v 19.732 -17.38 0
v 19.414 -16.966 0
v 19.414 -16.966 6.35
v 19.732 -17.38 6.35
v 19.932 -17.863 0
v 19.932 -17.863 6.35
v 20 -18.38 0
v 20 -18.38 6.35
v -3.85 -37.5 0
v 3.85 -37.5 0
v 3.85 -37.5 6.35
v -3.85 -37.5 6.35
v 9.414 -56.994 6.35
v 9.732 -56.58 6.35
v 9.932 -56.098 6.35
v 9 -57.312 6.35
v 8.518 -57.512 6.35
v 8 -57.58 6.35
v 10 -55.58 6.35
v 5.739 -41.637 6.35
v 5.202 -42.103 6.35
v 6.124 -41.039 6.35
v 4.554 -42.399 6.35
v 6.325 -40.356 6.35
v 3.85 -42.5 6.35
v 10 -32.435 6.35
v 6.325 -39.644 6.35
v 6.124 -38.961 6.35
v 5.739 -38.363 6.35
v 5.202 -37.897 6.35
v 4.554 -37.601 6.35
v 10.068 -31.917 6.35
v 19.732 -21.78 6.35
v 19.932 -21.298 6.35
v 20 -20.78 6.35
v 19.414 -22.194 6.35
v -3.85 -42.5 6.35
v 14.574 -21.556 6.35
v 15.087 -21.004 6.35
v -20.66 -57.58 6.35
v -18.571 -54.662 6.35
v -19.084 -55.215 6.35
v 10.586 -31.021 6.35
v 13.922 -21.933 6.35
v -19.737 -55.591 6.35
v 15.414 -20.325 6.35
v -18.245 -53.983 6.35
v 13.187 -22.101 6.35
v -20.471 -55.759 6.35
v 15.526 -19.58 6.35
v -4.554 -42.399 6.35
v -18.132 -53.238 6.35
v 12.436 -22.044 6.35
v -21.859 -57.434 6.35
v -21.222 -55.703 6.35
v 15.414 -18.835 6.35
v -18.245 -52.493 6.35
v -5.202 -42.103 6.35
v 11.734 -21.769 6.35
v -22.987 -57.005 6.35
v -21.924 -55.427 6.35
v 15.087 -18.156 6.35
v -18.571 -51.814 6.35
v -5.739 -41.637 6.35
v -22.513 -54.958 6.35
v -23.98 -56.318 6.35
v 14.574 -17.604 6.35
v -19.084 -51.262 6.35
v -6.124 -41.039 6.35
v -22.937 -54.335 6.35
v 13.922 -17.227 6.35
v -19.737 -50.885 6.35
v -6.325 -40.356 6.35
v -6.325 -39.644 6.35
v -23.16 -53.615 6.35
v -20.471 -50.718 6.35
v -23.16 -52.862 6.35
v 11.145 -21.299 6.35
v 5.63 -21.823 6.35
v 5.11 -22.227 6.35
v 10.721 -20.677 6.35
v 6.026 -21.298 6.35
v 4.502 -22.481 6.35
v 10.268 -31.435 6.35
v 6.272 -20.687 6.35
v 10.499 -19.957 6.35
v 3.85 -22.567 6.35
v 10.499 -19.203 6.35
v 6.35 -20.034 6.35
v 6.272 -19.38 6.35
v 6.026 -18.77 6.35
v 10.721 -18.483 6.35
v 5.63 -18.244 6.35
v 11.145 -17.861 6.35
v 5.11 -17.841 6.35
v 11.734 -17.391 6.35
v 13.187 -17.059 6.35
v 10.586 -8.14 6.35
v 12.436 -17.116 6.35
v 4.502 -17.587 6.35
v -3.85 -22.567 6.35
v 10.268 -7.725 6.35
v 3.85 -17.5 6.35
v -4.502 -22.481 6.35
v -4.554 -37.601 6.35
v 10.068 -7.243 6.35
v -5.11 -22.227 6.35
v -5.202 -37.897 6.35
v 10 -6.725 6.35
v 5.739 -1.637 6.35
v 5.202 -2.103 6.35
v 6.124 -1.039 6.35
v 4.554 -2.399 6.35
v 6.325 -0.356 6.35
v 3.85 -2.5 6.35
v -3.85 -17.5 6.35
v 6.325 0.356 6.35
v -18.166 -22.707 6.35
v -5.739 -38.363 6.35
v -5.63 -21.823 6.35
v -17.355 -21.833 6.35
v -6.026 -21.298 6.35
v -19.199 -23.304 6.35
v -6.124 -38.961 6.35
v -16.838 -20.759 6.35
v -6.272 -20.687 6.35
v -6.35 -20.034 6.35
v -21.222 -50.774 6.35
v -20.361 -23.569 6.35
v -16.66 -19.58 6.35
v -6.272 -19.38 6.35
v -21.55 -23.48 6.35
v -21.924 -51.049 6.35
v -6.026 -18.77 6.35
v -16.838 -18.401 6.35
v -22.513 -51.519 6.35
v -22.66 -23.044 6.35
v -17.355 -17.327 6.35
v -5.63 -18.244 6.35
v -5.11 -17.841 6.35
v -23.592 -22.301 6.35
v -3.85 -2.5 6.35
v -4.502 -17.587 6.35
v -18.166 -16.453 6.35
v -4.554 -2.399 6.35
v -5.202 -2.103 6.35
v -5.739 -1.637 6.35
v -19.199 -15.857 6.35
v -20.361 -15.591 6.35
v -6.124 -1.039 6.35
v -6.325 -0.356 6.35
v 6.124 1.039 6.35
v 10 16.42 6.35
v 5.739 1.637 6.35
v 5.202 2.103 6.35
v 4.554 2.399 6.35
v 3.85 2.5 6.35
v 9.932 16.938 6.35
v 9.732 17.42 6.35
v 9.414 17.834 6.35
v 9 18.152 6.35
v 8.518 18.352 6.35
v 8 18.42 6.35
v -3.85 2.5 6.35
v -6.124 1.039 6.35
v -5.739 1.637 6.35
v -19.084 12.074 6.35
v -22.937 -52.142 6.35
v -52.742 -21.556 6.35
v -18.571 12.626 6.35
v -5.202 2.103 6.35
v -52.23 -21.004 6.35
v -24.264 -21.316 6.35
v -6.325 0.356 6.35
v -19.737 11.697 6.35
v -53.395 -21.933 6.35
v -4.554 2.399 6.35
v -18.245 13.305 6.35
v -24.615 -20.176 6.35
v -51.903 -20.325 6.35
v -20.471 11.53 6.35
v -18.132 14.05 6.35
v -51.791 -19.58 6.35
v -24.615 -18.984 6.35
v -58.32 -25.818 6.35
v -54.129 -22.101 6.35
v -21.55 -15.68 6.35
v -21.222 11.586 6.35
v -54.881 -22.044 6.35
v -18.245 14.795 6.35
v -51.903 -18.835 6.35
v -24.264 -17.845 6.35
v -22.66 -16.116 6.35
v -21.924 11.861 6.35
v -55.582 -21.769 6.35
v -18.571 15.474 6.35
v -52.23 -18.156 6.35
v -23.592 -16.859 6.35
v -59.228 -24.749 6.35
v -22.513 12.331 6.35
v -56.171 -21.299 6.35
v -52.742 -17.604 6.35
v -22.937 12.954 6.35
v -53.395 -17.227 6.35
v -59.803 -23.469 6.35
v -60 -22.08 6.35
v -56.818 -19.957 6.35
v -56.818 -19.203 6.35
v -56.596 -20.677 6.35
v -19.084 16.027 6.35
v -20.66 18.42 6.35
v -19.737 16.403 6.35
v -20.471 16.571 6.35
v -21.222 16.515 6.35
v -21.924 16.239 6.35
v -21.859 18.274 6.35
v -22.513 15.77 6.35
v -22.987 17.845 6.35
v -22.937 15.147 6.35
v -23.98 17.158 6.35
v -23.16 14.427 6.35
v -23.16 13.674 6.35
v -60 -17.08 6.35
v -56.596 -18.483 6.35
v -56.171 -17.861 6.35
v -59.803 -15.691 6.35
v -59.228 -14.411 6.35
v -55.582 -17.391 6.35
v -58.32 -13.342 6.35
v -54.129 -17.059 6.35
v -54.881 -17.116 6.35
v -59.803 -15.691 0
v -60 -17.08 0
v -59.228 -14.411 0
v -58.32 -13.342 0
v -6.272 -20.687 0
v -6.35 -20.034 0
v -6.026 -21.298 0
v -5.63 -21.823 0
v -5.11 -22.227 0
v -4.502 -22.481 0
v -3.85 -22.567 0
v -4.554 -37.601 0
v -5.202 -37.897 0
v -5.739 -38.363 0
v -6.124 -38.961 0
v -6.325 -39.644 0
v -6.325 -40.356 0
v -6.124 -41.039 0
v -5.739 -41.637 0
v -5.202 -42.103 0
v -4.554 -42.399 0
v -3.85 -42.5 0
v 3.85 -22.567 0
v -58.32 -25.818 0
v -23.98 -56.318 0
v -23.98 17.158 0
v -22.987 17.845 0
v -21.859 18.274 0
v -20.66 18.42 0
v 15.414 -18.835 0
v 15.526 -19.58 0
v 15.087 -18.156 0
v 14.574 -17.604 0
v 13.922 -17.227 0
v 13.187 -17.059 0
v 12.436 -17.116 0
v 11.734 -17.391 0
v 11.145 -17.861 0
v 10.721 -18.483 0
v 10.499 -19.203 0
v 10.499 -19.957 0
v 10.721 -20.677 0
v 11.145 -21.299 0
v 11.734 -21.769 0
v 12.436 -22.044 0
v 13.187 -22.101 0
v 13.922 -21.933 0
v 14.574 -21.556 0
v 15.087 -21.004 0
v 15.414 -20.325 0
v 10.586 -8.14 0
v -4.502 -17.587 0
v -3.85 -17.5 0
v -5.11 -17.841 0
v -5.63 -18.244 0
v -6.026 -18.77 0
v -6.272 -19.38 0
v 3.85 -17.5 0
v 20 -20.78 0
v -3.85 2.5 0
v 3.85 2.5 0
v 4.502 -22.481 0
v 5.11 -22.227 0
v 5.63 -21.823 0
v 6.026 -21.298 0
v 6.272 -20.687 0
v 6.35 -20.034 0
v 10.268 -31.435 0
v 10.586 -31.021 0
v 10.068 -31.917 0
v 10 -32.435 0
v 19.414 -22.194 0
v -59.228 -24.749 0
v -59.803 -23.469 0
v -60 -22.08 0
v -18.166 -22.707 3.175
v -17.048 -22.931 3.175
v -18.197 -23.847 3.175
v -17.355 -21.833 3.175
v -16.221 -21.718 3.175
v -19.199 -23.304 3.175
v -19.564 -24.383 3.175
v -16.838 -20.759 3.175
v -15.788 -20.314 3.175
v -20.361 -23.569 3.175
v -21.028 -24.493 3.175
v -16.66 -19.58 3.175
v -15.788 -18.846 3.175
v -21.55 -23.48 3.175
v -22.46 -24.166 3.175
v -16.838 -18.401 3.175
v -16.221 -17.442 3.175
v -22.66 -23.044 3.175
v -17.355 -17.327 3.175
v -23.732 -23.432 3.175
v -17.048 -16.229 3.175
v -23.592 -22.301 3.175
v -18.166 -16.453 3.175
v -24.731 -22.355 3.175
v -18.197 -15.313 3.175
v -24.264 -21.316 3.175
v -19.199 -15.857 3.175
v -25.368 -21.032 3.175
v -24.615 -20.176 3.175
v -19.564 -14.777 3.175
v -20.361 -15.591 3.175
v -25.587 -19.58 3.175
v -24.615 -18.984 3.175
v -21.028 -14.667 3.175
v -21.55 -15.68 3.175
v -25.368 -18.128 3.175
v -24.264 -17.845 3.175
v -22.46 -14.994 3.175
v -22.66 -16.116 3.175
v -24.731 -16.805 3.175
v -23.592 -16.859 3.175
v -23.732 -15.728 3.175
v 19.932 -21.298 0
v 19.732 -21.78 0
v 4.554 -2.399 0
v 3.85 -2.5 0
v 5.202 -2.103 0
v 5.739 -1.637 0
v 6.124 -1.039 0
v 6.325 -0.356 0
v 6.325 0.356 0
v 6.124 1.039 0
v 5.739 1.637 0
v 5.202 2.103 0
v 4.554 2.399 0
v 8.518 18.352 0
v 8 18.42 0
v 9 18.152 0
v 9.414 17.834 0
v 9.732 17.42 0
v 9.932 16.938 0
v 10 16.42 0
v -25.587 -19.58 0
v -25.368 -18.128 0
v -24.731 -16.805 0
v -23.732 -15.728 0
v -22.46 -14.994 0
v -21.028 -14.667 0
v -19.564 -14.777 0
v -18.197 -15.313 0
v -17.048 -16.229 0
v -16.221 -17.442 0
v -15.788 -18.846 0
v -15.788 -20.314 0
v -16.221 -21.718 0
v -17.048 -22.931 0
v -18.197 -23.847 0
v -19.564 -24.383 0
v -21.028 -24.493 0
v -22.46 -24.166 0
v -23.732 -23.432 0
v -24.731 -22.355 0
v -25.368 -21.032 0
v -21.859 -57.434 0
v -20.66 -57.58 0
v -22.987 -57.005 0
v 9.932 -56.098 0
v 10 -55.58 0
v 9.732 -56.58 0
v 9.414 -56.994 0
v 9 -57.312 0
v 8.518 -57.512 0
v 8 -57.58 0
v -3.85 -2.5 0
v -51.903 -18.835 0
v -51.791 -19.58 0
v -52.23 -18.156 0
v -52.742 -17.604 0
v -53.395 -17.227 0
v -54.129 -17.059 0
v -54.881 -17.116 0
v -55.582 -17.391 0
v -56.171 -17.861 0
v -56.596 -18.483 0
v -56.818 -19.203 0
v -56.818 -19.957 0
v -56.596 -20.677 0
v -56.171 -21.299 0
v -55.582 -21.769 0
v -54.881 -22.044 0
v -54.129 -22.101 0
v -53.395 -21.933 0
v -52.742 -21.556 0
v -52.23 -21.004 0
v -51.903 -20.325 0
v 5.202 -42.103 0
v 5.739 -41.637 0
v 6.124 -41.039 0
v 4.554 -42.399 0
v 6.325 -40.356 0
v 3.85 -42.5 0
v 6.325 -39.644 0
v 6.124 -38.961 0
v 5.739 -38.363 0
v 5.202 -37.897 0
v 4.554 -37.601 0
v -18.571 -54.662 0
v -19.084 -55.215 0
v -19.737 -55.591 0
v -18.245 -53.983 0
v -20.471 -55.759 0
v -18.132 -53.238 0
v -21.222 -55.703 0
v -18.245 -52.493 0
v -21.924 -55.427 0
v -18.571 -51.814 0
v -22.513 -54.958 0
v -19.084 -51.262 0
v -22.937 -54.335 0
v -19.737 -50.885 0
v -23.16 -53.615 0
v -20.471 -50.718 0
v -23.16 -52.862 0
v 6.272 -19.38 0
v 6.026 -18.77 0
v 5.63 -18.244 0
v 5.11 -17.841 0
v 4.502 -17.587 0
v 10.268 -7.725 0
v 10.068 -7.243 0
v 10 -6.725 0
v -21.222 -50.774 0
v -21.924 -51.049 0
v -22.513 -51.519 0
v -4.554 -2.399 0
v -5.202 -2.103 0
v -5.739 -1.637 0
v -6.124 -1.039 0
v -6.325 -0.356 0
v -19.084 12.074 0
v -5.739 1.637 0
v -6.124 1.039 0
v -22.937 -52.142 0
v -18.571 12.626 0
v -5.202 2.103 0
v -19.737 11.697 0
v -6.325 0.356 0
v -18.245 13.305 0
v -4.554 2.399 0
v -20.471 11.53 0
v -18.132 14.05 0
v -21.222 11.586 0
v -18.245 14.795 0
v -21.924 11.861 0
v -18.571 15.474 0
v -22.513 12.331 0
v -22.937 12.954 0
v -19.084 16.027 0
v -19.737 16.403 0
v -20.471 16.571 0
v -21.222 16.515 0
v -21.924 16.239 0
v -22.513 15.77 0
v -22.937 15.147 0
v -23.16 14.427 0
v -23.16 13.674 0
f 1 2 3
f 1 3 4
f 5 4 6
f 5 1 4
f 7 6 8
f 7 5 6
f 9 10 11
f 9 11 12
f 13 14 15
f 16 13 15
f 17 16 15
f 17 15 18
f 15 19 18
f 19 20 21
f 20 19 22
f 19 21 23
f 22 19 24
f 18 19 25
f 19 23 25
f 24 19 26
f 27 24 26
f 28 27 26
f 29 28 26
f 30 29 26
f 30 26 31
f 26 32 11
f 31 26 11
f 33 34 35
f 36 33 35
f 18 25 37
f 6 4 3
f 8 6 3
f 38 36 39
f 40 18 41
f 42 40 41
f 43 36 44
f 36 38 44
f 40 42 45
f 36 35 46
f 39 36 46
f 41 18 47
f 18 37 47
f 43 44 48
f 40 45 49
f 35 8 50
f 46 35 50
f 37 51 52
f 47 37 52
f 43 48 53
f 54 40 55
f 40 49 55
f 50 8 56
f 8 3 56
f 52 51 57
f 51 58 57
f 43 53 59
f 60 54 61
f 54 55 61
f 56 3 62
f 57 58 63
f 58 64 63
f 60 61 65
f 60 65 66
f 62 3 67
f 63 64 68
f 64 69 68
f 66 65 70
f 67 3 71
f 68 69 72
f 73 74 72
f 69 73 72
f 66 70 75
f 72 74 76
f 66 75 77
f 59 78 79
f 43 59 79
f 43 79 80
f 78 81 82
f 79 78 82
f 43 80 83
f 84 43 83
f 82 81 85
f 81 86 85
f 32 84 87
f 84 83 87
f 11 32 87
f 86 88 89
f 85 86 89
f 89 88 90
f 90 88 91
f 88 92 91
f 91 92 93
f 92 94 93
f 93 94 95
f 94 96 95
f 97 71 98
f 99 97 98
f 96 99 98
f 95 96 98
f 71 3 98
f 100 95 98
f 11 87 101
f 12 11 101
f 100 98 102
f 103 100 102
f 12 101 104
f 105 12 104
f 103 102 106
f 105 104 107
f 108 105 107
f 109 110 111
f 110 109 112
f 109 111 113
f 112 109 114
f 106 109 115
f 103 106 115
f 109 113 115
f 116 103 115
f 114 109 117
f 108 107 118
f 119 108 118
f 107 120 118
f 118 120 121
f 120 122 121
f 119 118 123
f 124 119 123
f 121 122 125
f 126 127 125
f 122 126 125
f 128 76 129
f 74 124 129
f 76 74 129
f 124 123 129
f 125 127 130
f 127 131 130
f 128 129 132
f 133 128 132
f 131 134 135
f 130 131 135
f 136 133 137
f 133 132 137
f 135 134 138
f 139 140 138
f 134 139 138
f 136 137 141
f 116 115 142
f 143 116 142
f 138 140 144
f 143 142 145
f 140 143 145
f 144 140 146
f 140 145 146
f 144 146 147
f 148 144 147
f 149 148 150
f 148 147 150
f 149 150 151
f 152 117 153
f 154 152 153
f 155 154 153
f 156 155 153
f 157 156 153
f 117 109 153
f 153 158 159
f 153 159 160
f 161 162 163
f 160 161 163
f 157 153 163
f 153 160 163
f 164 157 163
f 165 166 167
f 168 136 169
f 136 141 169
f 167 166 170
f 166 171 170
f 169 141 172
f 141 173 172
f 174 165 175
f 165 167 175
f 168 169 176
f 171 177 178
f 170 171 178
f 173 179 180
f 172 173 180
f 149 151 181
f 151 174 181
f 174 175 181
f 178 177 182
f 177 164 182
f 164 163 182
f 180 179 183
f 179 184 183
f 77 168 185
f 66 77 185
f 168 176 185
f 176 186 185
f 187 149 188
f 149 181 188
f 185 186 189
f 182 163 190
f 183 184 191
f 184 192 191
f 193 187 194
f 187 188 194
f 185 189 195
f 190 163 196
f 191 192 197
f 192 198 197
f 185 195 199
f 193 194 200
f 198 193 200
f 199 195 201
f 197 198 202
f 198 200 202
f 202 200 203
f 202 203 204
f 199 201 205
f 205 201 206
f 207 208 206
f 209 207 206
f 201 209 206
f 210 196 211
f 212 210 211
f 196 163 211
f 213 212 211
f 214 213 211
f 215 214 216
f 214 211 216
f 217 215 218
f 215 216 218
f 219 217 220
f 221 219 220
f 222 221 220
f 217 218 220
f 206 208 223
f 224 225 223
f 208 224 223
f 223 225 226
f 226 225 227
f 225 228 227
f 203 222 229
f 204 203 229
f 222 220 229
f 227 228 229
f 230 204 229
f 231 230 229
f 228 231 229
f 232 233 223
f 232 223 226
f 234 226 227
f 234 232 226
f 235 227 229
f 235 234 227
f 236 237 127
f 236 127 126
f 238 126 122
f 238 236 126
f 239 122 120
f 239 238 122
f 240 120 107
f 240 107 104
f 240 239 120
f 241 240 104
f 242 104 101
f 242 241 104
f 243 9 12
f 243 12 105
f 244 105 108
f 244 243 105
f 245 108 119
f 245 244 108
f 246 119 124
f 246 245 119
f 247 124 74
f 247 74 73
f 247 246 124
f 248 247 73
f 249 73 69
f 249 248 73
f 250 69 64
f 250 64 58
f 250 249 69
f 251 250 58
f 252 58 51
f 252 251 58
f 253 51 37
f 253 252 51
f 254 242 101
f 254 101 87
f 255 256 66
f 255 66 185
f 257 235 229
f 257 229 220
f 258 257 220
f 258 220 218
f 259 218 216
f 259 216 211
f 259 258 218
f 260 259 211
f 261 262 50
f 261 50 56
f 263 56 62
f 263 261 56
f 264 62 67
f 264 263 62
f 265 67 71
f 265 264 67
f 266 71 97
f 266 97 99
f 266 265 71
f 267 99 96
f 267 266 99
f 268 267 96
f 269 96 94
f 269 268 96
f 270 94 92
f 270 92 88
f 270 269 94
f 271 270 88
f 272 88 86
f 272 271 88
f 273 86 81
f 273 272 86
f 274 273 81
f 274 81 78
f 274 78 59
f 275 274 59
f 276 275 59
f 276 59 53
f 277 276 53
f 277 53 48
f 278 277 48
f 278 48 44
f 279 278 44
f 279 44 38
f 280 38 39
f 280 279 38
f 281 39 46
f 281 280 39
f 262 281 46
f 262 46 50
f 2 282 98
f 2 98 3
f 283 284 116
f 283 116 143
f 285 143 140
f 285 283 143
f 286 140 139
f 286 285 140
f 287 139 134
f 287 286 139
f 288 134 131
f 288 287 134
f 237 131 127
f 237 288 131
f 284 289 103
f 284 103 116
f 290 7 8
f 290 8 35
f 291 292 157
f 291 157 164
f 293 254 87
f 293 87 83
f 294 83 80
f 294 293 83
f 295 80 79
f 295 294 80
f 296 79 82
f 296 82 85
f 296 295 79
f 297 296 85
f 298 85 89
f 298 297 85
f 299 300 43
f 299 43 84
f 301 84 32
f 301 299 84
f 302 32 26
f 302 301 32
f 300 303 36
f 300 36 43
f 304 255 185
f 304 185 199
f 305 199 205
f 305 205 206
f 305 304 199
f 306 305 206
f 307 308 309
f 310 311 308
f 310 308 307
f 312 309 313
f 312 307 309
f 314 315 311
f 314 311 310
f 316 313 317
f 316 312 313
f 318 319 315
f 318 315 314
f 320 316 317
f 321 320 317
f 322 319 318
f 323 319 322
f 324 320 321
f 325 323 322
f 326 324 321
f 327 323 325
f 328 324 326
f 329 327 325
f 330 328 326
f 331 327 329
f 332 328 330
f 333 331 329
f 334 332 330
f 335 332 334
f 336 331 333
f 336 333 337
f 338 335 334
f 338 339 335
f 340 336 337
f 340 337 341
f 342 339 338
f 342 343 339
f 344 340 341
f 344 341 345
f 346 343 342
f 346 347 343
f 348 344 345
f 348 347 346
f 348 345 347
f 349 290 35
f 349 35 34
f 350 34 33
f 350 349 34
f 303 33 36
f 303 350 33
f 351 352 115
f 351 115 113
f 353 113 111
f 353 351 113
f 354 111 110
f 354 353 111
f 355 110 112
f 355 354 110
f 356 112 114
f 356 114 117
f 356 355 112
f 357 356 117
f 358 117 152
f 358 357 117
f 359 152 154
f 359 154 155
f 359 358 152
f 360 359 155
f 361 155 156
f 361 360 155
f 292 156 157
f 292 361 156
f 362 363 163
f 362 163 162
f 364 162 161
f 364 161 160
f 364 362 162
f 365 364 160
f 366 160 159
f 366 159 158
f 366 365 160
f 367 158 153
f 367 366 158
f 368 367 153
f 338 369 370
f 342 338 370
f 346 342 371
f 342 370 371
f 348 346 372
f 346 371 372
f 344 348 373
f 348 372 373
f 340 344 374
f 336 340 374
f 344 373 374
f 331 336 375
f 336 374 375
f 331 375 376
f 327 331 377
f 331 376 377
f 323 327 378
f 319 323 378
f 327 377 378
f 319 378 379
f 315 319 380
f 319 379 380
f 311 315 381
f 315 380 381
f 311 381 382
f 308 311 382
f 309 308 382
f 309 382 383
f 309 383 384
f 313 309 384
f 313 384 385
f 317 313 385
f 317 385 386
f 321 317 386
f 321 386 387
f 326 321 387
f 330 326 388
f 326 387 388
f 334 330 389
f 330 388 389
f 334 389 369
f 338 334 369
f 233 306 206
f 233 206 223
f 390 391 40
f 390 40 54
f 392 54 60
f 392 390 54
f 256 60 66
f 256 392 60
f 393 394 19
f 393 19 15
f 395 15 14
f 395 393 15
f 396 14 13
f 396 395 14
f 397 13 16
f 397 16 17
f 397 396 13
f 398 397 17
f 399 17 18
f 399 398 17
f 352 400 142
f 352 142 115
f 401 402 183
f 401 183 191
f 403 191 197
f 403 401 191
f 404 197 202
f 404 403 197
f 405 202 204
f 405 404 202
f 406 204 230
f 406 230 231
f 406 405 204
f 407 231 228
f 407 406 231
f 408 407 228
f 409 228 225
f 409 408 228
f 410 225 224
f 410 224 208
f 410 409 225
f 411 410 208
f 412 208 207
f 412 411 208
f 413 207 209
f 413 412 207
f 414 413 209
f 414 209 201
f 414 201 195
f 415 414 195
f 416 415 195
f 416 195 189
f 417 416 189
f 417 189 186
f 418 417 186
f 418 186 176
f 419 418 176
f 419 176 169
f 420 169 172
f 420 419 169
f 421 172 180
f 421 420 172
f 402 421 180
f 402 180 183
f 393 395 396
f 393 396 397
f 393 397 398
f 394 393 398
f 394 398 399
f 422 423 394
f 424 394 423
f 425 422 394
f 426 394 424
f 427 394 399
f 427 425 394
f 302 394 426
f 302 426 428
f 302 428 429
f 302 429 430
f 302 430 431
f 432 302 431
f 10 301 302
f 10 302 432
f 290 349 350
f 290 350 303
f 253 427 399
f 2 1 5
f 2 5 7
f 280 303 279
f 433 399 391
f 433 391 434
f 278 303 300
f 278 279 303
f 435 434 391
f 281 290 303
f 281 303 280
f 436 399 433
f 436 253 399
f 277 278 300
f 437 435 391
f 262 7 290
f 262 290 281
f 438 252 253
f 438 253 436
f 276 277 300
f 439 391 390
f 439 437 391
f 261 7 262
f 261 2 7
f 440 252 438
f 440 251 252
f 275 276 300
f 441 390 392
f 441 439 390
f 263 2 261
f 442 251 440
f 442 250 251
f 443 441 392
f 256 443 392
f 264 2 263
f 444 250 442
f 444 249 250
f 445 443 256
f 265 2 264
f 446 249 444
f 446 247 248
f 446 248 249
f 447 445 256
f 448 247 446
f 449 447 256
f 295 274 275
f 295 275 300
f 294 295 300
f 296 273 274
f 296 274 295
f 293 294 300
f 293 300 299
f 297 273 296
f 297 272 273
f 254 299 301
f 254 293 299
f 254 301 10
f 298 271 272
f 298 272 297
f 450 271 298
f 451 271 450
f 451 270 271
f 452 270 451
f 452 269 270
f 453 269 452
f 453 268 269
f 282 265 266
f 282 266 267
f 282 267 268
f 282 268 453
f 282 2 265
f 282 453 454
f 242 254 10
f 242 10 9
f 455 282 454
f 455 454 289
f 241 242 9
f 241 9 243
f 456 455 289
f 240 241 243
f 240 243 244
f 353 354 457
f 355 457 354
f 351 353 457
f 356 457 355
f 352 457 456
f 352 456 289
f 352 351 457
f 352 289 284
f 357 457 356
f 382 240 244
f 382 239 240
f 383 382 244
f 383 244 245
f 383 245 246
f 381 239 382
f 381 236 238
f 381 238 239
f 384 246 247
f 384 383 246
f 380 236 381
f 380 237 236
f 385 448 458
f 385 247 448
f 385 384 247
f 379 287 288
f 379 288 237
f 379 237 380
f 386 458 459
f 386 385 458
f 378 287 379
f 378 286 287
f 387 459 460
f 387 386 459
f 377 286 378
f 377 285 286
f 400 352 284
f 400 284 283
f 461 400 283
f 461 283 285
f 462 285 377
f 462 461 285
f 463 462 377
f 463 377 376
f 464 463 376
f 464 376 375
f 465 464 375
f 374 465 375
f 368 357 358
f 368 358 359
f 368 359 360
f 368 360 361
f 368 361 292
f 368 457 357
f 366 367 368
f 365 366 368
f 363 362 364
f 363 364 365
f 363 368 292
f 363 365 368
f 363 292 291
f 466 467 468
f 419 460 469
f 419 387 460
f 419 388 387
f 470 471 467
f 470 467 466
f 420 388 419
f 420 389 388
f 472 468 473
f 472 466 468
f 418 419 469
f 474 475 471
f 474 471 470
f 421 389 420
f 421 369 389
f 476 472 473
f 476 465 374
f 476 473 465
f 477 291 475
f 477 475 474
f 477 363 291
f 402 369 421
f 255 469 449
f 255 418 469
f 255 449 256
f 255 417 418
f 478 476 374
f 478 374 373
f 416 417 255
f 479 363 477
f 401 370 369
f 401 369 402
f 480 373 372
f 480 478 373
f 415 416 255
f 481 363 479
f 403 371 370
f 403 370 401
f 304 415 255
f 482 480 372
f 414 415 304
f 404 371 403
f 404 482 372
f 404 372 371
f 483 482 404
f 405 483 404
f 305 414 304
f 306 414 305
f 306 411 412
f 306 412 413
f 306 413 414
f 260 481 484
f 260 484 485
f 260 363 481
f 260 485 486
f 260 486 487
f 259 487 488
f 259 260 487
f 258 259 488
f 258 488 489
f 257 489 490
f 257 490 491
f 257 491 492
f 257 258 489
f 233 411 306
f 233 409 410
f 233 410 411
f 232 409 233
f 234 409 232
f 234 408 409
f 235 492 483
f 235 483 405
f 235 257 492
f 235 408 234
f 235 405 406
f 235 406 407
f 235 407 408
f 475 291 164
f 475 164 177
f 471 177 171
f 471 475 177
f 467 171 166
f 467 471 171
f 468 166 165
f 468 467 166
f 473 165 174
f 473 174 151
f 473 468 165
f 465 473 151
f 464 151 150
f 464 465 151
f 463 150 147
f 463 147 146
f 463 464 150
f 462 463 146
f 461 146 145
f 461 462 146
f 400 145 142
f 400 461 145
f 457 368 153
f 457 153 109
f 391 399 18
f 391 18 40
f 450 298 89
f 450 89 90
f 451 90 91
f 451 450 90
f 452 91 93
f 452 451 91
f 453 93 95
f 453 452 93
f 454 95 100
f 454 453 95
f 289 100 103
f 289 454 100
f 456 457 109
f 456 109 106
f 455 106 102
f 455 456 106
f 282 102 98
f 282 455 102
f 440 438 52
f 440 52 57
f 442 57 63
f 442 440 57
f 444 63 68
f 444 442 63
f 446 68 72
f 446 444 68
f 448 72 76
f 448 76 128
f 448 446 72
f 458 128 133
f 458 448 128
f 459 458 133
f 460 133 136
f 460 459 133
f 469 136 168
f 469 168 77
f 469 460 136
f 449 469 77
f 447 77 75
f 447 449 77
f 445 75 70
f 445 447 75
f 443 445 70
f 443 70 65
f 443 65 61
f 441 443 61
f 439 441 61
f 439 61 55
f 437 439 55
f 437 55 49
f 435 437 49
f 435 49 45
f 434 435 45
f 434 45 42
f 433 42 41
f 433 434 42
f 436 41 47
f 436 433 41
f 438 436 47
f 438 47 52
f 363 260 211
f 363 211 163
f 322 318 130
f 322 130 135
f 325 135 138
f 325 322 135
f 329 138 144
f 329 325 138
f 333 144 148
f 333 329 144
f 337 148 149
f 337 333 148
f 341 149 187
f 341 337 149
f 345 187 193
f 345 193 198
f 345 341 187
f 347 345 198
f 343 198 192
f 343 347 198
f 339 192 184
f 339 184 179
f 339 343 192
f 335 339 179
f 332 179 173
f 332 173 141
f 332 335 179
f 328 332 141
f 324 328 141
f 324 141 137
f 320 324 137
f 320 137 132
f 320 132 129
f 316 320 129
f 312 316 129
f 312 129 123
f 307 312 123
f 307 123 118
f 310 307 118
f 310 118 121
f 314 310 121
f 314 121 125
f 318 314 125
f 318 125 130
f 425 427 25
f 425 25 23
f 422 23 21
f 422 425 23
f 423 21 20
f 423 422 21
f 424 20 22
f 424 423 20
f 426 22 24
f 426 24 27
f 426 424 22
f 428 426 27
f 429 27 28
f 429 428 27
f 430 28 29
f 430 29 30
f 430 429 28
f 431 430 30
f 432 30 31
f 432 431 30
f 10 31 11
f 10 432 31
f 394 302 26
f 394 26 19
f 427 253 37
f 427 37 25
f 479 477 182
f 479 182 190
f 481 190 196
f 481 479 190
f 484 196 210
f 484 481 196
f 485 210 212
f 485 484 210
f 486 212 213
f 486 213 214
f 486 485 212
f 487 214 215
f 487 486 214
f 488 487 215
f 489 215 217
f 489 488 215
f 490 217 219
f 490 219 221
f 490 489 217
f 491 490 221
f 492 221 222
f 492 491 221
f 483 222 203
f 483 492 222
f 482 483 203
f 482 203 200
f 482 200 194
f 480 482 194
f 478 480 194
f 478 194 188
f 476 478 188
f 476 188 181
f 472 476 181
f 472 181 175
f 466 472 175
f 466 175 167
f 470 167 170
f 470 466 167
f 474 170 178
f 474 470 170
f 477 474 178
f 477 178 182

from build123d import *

# Parameters (mm, degrees)
SKETCH1_R                 = 4
SKETCH1_R_2               = 2.527736539
BOSS_EXTRUDE1_DEPTH       = 6.35
F_5_0MM_DOWEL_SLOT1_DEPTH = 6.35
SKETCH4_R                 = 4.926776695
CUT_EXTRUDE1_DEPTH        = 3.175


# Read off the part's stored shape, not the designer's step: Ø5.0mm Dowel Slot1
with BuildPart() as part:
    # Sketch1 → Boss-Extrude1 (new body)
    with BuildSketch(Plane.XY):
        with BuildLine():
            Line((8, -57.58012907), (-20.66, -57.58012907))
            ThreePointArc((-20.66, -57.58012907), (-22.435973202, -57.254090899), (-23.980332383, -56.318496743))
            Line((-23.980332383, -56.318496743), (-58.320332383, -25.818496743))
            ThreePointArc((-58.320332383, -25.818496743), (-59.560792799, -24.12931648), (-60, -22.08012907))
            Line((-60, -22.08012907), (-60, -17.08012907))
            ThreePointArc((-60, -17.08012907), (-59.560792799, -15.03094166), (-58.320332383, -13.341761396))
            Line((-58.320332383, -13.341761396), (-23.980332383, 17.158238604))
            ThreePointArc((-23.980332383, 17.158238604), (-22.435973202, 18.09383276), (-20.66, 18.41987093))
            Line((-20.66, 18.41987093), (8, 18.41987093))
            ThreePointArc((8, 18.41987093), (9.414213562, 17.834084493), (10, 16.41987093))
            Line((10, 16.41987093), (10, -6.725270109))
            ThreePointArc((10, -6.725270109), (10.152279768, -7.490730718), (10.585929943, -8.139627163))
            Line((10.585929943, -8.139627163), (19.414070057, -16.965975896))
            ThreePointArc((19.414070057, -16.965975896), (19.847720232, -17.614872341), (20, -18.38033295))
            Line((20, -18.38033295), (20, -20.77992519))
            ThreePointArc((20, -20.77992519), (19.847720232, -21.545385798), (19.414070057, -22.194282243))
            Line((19.414070057, -22.194282243), (10.585929943, -31.020630977))
            ThreePointArc((10.585929943, -31.020630977), (10.152279768, -31.669527422), (10, -32.43498803))
            Line((10, -32.43498803), (10, -55.58012907))
            ThreePointArc((10, -55.58012907), (9.414213562, -56.994342632), (8, -57.58012907))
        make_face()
        with Locations((-20.66, -19.58012907)):
            Circle(SKETCH1_R, mode=Mode.SUBTRACT)
        with Locations((-54.318282784, -19.58012907)):
            Circle(SKETCH1_R_2, mode=Mode.SUBTRACT)
        with Locations((-20.66, 14.050414337)):
            Circle(SKETCH1_R_2, mode=Mode.SUBTRACT)
        with Locations((12.998282784, -19.58012907)):
            Circle(SKETCH1_R_2, mode=Mode.SUBTRACT)
        with Locations((-20.66, -53.238409212)):
            Circle(SKETCH1_R_2, mode=Mode.SUBTRACT)
    extrude(amount=BOSS_EXTRUDE1_DEPTH)

    # Ø5.0mm Dowel Slot1 outline → Ø5.0mm Dowel Slot1 (cut)
    with BuildSketch(Plane.XY):
        with BuildLine():
            ThreePointArc((3.85, -22.567426083), (5.629646398, -21.823233219), (6.349772676, -20.033713042))
            ThreePointArc((6.349772676, -20.033713042), (5.629646398, -18.244192864), (3.85, -17.5))
            Line((3.85, -17.5), (-3.85, -17.5))
            ThreePointArc((-3.85, -17.5), (-5.629646398, -18.244192864), (-6.349772676, -20.033713042))
            ThreePointArc((-6.349772676, -20.033713042), (-5.629646398, -21.823233219), (-3.85, -22.567426083))
            Line((-3.85, -22.567426083), (3.85, -22.567426083))
        make_face()
        with BuildLine():
            Line((-3.85, -2.5), (3.85, -2.5))
            ThreePointArc((3.85, -2.5), (6.35, 0), (3.85, 2.5))
            Line((3.85, 2.5), (-3.85, 2.5))
            ThreePointArc((-3.85, 2.5), (-6.35, 0), (-3.85, -2.5))
        make_face()
        with BuildLine():
            Line((-3.85, -42.5), (3.85, -42.5))
            ThreePointArc((3.85, -42.5), (6.35, -40), (3.85, -37.5))
            Line((3.85, -37.5), (-3.85, -37.5))
            ThreePointArc((-3.85, -37.5), (-6.35, -40), (-3.85, -42.5))
        make_face()
    extrude(amount=F_5_0MM_DOWEL_SLOT1_DEPTH, mode=Mode.SUBTRACT)

    # Sketch4 → Cut-Extrude1 (cut)
    with BuildSketch(Plane(origin=(0, 0, 0), x_dir=(-1, 0, 0), z_dir=(0, 0, -1))):
        with Locations((20.66, -19.58012907)):
            Circle(SKETCH4_R)
    extrude(amount=-CUT_EXTRUDE1_DEPTH, mode=Mode.SUBTRACT)


solid = part.part
